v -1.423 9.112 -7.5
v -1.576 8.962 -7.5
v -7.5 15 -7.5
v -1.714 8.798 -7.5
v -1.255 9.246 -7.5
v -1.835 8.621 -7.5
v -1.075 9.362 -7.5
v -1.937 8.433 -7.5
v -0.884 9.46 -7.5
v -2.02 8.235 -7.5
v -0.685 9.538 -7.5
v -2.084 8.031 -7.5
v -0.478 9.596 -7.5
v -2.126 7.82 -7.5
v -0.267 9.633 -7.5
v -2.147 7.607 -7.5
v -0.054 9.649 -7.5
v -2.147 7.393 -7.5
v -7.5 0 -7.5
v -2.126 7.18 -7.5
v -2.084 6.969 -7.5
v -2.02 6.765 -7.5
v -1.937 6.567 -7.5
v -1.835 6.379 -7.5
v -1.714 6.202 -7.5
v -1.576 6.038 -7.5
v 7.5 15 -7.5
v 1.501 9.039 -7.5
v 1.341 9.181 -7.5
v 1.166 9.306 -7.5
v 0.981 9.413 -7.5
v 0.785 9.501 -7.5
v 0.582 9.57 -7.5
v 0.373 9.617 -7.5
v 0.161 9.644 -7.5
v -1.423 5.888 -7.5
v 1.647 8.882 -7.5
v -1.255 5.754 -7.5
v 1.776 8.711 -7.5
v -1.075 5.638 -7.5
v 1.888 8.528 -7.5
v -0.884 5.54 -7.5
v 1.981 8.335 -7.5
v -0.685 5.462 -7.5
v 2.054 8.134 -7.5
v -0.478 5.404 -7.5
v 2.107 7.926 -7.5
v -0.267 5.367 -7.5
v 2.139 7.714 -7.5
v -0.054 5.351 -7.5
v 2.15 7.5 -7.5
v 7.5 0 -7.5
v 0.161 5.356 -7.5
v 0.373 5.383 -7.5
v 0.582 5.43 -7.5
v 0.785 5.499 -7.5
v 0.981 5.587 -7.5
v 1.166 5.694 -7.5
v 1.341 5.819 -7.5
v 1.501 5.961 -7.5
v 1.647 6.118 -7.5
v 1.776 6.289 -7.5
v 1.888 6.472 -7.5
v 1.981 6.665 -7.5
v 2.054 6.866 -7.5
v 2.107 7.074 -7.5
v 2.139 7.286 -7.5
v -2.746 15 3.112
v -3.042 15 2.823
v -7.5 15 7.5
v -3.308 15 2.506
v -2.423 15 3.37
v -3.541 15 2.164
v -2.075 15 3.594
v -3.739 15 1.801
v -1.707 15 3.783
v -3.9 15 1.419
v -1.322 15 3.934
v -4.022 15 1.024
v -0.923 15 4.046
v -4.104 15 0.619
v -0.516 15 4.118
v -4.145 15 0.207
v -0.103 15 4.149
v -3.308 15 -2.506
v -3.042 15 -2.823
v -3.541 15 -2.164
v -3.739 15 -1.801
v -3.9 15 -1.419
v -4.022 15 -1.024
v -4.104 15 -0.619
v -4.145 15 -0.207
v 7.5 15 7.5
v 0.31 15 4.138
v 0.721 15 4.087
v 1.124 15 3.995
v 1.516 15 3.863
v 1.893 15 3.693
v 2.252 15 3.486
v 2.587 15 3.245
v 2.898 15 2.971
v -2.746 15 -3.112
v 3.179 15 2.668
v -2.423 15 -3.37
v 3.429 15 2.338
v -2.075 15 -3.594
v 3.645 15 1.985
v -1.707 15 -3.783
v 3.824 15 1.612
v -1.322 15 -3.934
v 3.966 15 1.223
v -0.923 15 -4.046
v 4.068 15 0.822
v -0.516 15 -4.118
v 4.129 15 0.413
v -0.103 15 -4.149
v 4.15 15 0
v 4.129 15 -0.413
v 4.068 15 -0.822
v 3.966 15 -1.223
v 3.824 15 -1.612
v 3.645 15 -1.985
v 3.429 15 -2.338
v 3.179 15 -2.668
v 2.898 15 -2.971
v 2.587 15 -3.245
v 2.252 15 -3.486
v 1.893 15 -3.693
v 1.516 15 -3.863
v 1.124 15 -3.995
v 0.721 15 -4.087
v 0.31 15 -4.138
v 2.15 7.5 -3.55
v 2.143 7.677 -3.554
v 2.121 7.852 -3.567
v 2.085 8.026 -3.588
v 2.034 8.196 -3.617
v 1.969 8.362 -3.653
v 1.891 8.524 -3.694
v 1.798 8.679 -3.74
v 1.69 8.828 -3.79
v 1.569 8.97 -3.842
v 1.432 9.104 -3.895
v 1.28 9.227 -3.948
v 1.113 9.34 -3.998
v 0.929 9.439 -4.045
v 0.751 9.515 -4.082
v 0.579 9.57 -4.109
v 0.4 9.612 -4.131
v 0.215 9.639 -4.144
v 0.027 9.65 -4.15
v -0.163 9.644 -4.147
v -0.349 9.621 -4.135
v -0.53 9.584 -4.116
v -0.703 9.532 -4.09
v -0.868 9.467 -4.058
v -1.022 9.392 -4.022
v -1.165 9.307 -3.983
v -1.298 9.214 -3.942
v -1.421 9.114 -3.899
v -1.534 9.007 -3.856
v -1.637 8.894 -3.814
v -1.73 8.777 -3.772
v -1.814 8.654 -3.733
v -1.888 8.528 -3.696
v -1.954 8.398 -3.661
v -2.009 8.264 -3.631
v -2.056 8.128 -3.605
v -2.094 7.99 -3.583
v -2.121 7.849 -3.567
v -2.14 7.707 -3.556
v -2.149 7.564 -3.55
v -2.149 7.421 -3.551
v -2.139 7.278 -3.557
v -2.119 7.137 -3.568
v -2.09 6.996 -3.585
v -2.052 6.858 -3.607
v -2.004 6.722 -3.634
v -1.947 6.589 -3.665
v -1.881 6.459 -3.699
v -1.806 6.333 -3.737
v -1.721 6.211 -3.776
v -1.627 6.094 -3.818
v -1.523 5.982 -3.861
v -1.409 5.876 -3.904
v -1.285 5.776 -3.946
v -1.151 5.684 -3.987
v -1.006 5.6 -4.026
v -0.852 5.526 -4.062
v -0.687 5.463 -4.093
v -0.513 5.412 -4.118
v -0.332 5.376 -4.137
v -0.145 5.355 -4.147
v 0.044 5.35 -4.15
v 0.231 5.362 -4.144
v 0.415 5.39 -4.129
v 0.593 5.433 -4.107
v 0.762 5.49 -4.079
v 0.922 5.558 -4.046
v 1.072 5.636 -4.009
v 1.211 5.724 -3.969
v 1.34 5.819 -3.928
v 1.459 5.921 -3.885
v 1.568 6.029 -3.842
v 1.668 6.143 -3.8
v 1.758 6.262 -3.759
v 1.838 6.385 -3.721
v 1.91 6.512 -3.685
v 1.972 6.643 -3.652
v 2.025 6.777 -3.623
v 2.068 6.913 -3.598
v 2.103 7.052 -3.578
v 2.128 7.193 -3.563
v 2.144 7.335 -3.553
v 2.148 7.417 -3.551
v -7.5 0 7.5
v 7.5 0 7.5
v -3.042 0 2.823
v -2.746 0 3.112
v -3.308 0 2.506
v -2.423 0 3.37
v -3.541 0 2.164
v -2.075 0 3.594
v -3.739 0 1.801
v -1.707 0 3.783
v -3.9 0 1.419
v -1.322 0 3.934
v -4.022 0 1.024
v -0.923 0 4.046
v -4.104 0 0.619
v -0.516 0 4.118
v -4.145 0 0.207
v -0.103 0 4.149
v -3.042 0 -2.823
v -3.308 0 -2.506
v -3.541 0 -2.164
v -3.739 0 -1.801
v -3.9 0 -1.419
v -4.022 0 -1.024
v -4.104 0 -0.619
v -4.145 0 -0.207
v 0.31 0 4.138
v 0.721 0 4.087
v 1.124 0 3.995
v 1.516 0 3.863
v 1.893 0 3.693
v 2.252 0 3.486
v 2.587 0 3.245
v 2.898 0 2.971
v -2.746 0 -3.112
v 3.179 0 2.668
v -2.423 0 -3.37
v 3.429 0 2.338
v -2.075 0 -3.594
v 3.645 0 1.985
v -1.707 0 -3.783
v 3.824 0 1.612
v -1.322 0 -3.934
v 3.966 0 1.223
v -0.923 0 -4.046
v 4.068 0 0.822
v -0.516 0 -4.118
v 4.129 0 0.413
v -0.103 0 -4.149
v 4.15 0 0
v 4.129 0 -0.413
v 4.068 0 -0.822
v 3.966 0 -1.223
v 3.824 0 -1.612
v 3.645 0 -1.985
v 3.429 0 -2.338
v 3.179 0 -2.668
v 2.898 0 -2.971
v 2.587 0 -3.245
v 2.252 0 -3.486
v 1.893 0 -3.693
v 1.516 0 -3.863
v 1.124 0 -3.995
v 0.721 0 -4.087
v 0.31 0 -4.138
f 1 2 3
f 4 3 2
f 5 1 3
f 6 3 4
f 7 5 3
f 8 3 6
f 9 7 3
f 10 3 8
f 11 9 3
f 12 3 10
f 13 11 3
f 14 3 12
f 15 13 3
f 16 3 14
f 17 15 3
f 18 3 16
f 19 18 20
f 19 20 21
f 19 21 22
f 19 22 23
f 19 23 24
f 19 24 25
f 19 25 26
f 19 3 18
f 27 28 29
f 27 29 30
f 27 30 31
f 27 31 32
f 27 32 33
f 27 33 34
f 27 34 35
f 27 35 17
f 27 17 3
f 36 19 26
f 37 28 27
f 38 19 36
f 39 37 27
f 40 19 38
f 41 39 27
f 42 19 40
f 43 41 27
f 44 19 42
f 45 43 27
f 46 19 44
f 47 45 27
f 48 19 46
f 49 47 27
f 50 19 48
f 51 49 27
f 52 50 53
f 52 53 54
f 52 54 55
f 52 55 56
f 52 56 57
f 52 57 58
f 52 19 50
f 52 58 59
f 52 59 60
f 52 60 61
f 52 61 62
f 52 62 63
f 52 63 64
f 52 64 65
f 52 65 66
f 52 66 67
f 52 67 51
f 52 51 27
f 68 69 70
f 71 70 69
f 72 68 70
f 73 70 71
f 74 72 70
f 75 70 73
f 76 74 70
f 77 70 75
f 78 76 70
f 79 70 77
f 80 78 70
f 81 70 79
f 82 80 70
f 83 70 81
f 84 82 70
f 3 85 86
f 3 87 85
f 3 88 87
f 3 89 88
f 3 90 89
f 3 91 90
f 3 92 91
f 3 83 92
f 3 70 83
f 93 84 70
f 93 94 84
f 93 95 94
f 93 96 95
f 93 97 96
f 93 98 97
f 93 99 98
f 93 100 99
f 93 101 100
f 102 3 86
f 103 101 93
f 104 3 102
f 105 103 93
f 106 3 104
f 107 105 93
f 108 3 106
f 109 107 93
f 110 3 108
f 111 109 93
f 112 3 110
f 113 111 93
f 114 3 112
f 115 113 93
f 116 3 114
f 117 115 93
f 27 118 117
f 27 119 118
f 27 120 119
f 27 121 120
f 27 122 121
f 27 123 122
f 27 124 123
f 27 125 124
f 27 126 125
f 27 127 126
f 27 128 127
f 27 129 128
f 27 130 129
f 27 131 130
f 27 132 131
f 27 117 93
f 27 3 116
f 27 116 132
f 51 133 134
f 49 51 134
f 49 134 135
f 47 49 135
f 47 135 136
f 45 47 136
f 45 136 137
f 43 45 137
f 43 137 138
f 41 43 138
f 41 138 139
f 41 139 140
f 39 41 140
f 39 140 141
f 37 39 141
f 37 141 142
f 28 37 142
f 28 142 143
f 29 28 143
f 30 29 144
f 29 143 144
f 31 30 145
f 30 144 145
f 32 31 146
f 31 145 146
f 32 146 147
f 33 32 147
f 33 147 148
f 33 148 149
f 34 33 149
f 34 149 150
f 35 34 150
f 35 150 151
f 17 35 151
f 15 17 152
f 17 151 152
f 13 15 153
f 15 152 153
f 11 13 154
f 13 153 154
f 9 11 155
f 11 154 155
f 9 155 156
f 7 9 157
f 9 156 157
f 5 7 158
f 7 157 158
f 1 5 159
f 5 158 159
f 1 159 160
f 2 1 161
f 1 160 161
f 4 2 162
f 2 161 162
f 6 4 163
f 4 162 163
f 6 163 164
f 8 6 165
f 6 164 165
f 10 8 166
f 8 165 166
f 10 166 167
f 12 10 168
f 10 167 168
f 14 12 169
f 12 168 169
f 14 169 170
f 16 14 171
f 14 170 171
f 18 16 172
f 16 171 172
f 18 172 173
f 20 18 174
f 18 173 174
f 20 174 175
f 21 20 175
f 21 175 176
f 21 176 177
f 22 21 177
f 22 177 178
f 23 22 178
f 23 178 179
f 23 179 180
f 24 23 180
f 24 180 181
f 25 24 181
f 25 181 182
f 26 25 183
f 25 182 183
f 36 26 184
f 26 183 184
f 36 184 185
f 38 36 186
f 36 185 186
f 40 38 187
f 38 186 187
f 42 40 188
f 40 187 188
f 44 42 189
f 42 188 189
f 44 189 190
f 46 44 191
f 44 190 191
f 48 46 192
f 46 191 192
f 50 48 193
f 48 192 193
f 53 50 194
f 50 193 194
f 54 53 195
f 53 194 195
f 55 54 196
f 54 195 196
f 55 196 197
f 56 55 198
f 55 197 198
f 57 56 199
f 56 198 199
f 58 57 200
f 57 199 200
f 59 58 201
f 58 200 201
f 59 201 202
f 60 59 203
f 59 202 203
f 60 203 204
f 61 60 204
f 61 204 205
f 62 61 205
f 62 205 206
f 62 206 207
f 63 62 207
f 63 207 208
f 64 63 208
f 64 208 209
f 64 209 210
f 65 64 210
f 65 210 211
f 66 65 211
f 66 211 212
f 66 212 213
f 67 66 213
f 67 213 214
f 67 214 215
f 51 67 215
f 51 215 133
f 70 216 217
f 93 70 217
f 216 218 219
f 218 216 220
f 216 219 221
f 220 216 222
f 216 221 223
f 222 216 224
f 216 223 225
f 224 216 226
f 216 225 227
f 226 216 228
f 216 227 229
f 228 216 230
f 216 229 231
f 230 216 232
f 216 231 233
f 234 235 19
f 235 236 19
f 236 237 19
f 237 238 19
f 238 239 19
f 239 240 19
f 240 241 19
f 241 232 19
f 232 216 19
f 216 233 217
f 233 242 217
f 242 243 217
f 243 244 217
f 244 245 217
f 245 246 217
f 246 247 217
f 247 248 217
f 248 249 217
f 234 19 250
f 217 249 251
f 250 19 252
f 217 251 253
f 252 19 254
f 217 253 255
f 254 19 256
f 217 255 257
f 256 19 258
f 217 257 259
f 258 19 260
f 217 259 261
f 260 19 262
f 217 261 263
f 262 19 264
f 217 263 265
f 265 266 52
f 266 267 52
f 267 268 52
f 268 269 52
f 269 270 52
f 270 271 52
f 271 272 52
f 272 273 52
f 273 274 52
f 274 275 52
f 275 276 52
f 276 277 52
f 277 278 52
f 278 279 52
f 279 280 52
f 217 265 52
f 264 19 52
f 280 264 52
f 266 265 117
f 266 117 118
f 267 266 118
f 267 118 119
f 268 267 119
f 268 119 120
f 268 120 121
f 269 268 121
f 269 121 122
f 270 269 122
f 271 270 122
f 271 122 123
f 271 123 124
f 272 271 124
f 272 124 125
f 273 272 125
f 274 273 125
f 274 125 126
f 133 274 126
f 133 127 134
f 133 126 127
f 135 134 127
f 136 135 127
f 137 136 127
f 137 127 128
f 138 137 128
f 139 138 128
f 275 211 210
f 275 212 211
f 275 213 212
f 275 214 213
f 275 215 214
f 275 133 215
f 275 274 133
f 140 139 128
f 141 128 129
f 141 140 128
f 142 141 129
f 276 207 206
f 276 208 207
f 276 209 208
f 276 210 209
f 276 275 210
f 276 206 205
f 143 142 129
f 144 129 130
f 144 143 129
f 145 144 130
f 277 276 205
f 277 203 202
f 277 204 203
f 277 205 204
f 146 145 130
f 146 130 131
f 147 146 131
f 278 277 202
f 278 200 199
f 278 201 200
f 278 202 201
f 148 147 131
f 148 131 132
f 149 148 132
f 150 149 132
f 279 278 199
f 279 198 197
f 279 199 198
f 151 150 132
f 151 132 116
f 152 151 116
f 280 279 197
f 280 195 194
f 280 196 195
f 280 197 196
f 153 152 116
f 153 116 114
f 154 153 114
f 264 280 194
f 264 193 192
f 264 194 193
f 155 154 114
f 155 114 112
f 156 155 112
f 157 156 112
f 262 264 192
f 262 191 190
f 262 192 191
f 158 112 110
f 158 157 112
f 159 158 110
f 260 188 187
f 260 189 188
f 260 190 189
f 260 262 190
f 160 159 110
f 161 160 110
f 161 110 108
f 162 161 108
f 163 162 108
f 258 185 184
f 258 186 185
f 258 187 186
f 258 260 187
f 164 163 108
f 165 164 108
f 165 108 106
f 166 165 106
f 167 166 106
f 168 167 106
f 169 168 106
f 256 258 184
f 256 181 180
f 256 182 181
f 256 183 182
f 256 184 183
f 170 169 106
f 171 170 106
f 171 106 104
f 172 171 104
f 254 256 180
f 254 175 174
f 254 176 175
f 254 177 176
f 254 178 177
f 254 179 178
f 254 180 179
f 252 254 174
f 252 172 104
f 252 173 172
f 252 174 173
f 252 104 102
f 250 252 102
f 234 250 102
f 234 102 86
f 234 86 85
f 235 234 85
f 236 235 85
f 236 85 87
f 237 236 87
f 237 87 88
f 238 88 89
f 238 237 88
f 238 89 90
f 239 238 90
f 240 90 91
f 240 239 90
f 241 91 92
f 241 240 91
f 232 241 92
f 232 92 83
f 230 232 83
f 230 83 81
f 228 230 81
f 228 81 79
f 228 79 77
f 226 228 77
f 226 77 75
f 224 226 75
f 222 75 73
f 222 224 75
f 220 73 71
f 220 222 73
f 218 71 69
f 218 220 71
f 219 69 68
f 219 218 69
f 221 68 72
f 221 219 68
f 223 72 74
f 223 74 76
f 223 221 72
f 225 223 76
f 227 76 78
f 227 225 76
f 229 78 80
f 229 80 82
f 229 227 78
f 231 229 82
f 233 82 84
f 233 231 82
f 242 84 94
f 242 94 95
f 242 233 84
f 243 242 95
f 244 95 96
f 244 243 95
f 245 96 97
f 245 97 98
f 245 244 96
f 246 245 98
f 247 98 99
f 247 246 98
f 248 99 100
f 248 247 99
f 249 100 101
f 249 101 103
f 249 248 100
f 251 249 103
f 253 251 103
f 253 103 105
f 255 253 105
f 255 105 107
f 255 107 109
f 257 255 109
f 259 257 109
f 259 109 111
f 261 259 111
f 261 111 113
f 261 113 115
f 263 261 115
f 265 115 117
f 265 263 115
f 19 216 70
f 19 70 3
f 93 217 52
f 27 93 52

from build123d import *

# Parameters (mm, degrees)
ESQUISSE1_W             = 15
ESQUISSE1_H             = 15
ESQUISSE1_R             = 4.15
BOSS_EXTRU_1_DEPTH      = 15
ESQUISSE2_R             = 2.15
ENL_V_MAT_EXTRU_1_DEPTH = 8.5


with BuildPart() as part:
    # Esquisse1 → Boss.-Extru.1 (new body)
    with BuildSketch(Plane(origin=(0, 0, 0), x_dir=(1, 0, 0), z_dir=(0, 1, 0))):
        Rectangle(ESQUISSE1_W, ESQUISSE1_H)
        Circle(ESQUISSE1_R, mode=Mode.SUBTRACT)
    extrude(amount=BOSS_EXTRU_1_DEPTH)

    # Esquisse2 → Enlèv. mat.-Extru.1 (cut, through all)
    with BuildSketch(Plane.XY):
        with Locations((0, 7.5)):
            Circle(ESQUISSE2_R)
    extrude(amount=-ENL_V_MAT_EXTRU_1_DEPTH, mode=Mode.SUBTRACT)


solid = part.part
